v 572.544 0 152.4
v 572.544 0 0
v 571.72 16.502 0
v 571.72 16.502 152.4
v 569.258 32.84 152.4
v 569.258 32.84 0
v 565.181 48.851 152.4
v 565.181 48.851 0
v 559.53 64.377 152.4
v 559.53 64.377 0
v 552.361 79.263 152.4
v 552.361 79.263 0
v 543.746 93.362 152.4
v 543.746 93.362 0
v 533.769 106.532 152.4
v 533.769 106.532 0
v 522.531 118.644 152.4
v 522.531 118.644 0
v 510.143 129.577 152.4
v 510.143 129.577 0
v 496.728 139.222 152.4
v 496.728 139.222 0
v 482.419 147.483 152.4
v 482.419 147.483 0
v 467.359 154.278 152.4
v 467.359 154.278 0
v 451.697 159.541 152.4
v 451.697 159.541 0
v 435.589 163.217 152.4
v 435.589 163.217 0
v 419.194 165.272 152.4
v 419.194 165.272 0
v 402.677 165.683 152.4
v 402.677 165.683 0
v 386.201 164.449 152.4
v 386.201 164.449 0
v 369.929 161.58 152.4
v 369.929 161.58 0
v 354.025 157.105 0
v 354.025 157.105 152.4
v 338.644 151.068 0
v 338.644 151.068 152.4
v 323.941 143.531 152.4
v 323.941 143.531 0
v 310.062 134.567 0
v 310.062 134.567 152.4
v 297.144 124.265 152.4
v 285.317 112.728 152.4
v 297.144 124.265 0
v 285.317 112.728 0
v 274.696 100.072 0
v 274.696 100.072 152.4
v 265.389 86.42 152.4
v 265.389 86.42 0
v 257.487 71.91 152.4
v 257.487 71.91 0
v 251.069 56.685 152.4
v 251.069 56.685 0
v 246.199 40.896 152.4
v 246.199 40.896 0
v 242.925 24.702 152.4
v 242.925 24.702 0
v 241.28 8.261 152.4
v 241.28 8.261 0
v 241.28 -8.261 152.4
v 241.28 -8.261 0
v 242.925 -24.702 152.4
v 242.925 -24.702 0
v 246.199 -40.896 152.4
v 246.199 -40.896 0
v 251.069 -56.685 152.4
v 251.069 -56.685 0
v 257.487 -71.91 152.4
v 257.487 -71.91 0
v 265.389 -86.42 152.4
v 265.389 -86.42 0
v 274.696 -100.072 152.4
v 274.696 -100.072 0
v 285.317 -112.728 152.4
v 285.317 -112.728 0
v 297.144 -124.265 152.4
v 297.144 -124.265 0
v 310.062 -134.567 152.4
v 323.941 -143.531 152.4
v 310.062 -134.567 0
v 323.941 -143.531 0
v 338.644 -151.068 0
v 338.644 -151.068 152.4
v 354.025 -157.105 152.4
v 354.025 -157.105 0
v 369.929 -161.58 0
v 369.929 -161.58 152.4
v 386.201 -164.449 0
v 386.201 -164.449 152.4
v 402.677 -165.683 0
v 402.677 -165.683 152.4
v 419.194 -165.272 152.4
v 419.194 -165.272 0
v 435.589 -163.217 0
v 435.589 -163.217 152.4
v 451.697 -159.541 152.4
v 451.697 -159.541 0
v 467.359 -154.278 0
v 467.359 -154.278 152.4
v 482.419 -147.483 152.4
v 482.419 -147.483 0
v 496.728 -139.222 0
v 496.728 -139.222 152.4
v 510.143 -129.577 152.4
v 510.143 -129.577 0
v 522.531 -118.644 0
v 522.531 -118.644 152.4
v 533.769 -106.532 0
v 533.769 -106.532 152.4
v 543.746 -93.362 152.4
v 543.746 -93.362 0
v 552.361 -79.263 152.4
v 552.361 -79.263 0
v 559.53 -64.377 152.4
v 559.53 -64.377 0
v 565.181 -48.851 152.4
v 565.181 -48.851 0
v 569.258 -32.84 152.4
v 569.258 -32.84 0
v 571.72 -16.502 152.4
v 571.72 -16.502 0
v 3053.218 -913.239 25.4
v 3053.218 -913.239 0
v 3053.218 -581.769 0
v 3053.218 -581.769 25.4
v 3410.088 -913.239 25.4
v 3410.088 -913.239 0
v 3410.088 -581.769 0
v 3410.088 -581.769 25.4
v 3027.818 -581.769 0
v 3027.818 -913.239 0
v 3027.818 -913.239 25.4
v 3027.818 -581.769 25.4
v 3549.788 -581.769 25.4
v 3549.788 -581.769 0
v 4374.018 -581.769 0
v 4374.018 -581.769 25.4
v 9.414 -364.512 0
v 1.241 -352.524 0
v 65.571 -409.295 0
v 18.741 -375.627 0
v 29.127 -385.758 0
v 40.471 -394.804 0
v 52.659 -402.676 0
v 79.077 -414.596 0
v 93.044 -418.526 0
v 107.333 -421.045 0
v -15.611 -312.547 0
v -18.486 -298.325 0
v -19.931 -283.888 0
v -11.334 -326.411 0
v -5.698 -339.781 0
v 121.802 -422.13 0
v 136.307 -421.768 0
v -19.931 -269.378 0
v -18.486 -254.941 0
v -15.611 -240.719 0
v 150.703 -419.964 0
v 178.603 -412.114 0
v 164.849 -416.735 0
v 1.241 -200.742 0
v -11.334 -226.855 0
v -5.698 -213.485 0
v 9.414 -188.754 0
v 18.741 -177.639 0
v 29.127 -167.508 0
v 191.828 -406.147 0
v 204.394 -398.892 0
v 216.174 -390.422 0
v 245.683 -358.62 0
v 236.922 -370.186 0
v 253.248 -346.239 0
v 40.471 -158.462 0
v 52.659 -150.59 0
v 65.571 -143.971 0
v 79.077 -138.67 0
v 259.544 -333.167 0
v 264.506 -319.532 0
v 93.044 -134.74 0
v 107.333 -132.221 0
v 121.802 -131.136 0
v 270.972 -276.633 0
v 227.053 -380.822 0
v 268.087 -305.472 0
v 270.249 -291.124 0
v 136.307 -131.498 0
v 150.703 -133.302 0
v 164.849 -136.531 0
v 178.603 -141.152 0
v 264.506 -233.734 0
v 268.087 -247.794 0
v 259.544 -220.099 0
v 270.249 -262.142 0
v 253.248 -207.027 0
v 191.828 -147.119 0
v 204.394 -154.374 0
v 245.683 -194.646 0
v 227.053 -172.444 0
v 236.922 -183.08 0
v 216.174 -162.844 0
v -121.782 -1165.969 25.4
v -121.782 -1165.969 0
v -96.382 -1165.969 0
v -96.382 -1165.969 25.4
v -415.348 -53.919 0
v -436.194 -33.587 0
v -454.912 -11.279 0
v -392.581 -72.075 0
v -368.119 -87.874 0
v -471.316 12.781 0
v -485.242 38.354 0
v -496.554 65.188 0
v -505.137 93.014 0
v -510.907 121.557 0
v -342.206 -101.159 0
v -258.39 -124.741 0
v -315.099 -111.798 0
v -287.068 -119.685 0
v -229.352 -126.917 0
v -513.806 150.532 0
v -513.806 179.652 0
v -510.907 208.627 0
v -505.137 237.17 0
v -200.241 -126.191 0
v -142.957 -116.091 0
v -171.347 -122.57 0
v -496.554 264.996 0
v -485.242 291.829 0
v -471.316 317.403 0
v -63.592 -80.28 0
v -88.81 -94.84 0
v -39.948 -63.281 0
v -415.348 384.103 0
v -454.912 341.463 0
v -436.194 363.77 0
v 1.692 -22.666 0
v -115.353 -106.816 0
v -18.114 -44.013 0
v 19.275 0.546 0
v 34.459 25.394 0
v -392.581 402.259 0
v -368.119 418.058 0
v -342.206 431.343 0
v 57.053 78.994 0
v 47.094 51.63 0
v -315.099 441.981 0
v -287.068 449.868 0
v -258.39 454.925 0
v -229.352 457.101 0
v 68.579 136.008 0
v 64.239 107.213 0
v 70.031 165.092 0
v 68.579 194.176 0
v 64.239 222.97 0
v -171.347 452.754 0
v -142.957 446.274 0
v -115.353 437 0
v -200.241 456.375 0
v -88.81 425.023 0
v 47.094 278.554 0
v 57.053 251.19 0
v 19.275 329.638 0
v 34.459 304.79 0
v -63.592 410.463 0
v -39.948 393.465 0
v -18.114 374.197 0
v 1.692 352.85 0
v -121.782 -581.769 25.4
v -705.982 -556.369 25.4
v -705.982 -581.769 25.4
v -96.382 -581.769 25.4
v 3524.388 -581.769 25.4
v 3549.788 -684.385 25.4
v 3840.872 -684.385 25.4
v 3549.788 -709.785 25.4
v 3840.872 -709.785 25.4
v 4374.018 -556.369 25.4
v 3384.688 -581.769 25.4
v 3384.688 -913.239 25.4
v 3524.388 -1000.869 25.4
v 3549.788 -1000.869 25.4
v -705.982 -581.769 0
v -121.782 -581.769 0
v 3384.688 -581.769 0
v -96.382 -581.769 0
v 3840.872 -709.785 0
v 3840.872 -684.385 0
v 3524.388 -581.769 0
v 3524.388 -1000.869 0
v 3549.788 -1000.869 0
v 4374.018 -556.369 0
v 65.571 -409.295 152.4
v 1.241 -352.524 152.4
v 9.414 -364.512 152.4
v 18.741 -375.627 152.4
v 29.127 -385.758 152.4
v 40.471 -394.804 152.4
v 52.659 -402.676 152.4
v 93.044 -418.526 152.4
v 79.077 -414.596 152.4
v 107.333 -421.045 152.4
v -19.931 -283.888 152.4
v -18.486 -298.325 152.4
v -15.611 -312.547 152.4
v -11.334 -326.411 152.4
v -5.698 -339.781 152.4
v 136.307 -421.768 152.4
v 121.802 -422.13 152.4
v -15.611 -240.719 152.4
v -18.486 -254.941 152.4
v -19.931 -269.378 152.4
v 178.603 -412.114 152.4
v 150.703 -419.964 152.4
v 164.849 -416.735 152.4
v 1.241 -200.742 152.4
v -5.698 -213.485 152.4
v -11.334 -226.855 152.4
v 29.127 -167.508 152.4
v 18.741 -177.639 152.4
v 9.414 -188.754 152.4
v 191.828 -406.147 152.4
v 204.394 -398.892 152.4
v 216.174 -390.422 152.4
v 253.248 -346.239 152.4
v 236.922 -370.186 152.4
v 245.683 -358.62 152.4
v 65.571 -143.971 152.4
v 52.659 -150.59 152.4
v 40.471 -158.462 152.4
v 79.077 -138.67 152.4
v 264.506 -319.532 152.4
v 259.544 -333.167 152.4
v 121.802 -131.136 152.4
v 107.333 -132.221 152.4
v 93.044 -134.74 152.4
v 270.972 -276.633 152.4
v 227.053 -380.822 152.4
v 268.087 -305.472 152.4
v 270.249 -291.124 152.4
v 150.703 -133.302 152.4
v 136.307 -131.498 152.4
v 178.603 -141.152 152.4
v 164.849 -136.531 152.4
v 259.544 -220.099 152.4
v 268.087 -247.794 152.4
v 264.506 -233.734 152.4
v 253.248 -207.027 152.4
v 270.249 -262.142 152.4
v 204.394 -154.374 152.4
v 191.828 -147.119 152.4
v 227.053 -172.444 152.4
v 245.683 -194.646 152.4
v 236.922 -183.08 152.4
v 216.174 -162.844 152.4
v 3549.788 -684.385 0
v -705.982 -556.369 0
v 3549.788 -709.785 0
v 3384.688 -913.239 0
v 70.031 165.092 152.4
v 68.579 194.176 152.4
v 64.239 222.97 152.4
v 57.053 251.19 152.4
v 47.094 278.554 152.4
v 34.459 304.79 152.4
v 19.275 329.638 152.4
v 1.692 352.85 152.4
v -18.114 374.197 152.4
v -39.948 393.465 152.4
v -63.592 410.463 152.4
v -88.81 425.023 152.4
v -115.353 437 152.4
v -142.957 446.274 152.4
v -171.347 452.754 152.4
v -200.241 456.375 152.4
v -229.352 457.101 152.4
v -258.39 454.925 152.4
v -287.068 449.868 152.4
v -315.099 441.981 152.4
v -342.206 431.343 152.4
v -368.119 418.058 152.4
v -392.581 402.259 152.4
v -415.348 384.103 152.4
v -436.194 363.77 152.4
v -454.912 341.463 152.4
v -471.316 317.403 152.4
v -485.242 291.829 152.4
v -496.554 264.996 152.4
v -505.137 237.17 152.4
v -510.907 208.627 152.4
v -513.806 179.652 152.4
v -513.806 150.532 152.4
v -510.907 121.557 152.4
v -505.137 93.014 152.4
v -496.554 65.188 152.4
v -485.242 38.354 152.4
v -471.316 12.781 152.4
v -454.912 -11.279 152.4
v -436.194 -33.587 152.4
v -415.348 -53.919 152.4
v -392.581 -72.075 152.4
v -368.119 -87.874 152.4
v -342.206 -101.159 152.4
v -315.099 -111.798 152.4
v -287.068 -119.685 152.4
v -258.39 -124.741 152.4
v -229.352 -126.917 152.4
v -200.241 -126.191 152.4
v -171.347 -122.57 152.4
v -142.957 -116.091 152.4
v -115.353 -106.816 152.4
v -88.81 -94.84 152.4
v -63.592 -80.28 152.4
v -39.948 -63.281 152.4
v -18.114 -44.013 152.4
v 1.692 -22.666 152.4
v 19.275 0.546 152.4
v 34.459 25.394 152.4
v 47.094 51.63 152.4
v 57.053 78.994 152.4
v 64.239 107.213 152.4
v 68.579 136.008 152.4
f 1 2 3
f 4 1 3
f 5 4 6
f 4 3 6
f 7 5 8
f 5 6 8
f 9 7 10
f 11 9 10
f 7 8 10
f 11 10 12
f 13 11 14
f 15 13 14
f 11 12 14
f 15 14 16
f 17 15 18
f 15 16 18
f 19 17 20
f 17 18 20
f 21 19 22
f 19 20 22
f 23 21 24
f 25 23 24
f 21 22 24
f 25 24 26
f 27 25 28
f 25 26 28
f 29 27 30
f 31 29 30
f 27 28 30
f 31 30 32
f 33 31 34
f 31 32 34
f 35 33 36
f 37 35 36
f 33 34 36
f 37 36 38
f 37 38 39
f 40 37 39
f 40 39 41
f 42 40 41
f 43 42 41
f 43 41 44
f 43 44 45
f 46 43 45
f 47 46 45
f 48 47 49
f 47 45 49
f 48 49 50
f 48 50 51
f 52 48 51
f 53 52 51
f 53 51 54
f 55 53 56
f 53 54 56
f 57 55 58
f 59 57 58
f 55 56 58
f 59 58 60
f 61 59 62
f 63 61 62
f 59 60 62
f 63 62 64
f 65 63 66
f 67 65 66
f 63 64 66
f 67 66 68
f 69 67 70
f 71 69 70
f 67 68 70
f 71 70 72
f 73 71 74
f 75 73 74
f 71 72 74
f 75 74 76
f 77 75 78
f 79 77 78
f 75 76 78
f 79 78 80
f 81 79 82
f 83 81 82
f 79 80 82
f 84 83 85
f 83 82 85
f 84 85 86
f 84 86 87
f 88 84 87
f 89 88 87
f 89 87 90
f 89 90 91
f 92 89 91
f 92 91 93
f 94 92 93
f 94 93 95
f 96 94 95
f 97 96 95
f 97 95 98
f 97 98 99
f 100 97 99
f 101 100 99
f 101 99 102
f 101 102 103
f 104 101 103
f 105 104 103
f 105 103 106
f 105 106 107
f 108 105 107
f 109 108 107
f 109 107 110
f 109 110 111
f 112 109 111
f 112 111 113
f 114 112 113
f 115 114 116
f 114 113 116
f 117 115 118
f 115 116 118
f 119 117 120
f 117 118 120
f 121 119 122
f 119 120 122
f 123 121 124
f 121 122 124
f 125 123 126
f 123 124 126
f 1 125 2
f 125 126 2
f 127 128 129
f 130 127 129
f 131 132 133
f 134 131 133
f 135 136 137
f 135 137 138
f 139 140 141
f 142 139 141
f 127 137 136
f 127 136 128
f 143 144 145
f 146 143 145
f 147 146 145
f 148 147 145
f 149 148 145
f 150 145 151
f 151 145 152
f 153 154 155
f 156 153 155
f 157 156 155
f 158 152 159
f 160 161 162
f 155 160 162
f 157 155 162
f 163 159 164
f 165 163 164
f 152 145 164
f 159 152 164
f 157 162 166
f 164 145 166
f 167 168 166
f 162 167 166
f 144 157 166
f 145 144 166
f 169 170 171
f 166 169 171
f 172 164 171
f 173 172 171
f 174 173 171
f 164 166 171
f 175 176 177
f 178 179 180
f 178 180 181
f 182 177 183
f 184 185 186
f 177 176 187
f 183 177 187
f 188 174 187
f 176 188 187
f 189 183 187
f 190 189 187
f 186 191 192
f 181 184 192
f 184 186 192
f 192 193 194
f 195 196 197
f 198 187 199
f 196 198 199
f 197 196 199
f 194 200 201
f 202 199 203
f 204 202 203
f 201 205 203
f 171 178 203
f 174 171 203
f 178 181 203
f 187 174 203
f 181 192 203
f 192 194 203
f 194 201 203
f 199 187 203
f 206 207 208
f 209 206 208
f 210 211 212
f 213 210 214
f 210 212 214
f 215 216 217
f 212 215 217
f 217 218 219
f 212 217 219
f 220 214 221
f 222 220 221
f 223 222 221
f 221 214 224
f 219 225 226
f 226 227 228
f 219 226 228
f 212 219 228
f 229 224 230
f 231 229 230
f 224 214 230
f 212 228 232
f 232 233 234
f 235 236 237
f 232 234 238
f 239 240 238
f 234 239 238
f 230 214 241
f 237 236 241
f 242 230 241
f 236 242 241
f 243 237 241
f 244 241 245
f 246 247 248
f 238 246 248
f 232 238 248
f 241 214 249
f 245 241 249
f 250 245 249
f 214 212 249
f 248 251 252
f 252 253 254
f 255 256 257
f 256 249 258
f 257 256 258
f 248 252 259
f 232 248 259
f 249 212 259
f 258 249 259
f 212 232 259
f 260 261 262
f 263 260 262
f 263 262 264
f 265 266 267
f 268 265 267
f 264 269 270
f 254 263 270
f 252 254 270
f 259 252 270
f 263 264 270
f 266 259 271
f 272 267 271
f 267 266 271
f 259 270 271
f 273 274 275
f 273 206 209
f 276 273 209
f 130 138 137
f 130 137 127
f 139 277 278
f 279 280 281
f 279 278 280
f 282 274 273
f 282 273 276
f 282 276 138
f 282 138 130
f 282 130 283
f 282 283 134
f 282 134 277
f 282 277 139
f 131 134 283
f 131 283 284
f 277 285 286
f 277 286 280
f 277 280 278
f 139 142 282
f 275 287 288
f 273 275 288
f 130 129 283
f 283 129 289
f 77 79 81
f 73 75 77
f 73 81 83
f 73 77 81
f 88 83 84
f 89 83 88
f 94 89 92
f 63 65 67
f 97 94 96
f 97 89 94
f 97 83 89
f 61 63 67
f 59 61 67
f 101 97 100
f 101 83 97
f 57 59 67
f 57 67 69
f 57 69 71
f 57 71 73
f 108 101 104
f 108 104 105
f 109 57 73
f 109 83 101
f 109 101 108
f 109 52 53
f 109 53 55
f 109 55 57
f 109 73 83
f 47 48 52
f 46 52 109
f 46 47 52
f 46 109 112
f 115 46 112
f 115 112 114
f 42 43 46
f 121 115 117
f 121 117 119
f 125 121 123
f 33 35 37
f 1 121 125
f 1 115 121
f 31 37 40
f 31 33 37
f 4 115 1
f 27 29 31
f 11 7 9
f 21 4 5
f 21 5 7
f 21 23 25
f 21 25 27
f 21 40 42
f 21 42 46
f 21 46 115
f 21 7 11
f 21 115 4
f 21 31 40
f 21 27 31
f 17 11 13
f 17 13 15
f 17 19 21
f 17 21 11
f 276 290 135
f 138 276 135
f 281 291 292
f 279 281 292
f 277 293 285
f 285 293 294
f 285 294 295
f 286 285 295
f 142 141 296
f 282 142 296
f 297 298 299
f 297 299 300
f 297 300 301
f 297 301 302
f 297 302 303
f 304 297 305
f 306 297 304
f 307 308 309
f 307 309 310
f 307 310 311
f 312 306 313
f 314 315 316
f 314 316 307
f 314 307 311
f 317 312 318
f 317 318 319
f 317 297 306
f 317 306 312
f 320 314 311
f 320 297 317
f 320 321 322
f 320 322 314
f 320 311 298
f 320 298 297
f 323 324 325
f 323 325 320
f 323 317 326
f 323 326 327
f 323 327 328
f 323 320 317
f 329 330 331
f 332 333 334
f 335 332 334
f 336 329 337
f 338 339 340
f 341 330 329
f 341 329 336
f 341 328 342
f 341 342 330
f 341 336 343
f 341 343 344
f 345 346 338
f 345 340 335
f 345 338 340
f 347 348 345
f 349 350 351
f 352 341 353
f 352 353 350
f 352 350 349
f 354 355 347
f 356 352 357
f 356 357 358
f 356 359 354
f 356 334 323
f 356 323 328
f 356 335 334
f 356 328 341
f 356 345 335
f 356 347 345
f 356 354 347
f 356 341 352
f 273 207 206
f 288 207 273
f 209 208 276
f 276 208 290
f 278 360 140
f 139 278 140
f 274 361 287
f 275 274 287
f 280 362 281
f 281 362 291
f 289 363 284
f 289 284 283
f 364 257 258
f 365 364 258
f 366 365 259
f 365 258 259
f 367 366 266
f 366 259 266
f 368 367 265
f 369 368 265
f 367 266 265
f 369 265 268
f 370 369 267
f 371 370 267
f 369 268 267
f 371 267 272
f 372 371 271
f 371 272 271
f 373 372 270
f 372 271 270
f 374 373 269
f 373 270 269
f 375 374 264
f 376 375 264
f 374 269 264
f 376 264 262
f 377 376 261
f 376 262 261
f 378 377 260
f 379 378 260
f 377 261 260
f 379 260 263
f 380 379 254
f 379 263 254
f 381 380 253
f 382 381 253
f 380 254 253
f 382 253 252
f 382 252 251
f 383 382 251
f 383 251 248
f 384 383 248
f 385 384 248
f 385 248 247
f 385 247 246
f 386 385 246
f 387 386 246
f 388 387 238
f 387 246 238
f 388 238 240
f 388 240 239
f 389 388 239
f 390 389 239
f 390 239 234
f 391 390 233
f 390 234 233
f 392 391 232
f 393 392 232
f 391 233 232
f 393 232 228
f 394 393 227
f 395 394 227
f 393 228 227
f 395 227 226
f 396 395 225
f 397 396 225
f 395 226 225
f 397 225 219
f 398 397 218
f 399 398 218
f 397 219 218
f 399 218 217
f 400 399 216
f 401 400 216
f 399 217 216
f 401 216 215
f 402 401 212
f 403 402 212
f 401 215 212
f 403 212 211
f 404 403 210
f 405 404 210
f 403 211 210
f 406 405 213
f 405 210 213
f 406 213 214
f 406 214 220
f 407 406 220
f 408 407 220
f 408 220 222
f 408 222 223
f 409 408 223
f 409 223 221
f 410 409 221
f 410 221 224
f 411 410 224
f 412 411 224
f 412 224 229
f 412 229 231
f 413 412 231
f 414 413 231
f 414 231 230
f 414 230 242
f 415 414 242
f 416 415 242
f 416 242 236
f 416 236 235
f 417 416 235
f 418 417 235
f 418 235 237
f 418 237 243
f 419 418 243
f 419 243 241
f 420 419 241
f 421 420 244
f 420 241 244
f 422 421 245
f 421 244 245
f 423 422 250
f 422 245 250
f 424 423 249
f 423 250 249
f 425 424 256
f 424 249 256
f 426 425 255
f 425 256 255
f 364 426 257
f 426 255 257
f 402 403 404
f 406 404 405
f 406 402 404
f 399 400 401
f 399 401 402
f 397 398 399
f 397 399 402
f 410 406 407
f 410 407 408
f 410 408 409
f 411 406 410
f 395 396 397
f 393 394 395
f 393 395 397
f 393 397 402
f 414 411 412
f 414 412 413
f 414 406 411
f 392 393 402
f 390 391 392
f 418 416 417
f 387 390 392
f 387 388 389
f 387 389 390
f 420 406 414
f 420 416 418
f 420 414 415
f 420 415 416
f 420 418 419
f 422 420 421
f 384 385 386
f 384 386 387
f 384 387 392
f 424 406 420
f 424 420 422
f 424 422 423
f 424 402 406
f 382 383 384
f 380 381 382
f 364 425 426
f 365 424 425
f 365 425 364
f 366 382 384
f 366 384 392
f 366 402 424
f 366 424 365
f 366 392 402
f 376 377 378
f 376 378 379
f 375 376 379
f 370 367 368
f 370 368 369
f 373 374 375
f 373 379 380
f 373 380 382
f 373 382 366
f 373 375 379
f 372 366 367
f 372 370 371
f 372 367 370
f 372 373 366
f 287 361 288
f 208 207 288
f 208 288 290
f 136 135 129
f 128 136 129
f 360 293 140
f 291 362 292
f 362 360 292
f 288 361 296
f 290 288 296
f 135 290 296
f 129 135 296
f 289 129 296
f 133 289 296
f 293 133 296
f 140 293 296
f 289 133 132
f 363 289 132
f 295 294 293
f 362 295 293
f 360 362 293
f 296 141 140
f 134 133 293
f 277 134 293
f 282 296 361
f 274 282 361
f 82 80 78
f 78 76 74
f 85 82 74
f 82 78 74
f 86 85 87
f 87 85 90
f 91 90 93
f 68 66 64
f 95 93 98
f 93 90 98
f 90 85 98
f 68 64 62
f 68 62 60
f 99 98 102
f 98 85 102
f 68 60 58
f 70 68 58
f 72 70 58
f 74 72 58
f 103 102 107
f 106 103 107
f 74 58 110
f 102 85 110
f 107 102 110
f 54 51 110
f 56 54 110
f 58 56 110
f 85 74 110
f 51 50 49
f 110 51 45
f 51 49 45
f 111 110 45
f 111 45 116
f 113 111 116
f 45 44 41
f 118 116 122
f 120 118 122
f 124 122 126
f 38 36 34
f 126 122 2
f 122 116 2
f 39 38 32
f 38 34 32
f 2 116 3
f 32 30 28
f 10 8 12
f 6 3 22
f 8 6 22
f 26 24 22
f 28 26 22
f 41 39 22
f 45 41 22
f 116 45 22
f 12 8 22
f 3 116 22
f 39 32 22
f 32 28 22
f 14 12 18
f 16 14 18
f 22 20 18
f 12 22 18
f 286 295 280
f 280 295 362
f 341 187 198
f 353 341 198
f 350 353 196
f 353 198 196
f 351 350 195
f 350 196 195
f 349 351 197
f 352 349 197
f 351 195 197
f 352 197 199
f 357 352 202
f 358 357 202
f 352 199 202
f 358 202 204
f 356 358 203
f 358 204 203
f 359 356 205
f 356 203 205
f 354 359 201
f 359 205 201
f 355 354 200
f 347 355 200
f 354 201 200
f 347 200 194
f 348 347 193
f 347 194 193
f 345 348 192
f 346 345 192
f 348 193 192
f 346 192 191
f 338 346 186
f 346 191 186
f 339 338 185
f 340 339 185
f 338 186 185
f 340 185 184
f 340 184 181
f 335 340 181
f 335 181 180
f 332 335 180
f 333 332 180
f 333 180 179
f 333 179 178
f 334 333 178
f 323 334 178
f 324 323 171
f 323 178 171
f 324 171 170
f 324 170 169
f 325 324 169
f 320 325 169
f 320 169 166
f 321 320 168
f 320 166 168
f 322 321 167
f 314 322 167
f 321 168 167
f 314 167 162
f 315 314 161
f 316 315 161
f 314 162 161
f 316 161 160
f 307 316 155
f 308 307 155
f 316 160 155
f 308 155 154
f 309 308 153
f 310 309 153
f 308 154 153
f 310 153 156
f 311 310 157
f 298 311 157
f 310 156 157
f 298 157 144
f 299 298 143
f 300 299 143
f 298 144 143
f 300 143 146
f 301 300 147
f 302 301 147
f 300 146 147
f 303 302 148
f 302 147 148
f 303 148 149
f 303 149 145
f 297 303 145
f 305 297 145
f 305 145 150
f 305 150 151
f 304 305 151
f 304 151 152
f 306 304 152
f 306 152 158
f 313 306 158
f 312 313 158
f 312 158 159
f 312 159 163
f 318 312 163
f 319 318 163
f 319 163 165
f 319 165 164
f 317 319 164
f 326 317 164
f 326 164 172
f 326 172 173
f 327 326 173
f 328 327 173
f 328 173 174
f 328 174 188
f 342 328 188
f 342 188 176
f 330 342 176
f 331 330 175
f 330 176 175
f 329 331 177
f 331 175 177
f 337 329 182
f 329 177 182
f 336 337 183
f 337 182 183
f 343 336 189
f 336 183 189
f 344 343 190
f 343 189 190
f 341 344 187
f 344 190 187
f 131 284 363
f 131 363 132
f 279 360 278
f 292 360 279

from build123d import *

# Parameters (mm, degrees)
F0_R     = 165.735
F1_DEPTH = 152.4
F2_R     = 145.542
F3_DEPTH = 152.4
F4_R     = 292.1
F5_DEPTH = 152.4
F6_W     = 25.4
F6_H     = 584.2
F6_W_2   = 291.084
F6_H_2   = 25.4
F6_H_3   = 331.47
F7_DEPTH = 25.4


with BuildPart() as f1:
    # F0 (on Top) → F1 (new body)
    with BuildSketch(Plane.XY):
        with Locations((406.808984, 0)):
            Circle(F0_R)
    extrude(amount=F1_DEPTH)


with BuildPart() as f3:
    # F2 (on Top) → F3 (new body)
    with BuildSketch(Plane.XY):
        with Locations((125.430375, -276.632994)):
            Circle(F2_R)
    extrude(amount=F3_DEPTH)


with BuildPart() as f5:
    # F4 (on Top) → F5 (new body)
    with BuildSketch(Plane.XY):
        with Locations((-222.069457, 165.091917)):
            Circle(F4_R)
    extrude(amount=F5_DEPTH)


with BuildPart() as f7:
    # F6 (on Top) → F7 (new body)
    with BuildSketch(Plane.XY):
        Polygon((4374.017683, -556.369407), (-705.982317, -556.369407), (-705.982317, -581.769407), (-121.782317, -581.769407), (-96.382317, -581.769407), (3027.817683, -581.769407), (3053.217683, -581.769407), (3384.687683, -581.769407), (3410.087683, -581.769407), (3524.387683, -581.769407), (3549.787683, -581.769407), (4374.017683, -581.769407), align=None)
        with Locations((-109.082317, -873.869407)):
            Rectangle(F6_W, F6_H)
        with Locations((3695.329683, -697.085407)):
            Rectangle(F6_W_2, F6_H_2)
        Polygon((3549.787683, -684.385407), (3549.787683, -581.769407), (3524.387683, -581.769407), (3524.387683, -1000.869407), (3549.787683, -1000.869407), (3549.787683, -709.785407), align=None)
        with Locations((3397.387683, -747.504407)):
            Rectangle(F6_W, F6_H_3)
        with Locations((3040.517683, -747.504407)):
            Rectangle(F6_W, F6_H_3)
    extrude(amount=F7_DEPTH)


solid = Compound([f1.part, f3.part, f5.part, f7.part])
